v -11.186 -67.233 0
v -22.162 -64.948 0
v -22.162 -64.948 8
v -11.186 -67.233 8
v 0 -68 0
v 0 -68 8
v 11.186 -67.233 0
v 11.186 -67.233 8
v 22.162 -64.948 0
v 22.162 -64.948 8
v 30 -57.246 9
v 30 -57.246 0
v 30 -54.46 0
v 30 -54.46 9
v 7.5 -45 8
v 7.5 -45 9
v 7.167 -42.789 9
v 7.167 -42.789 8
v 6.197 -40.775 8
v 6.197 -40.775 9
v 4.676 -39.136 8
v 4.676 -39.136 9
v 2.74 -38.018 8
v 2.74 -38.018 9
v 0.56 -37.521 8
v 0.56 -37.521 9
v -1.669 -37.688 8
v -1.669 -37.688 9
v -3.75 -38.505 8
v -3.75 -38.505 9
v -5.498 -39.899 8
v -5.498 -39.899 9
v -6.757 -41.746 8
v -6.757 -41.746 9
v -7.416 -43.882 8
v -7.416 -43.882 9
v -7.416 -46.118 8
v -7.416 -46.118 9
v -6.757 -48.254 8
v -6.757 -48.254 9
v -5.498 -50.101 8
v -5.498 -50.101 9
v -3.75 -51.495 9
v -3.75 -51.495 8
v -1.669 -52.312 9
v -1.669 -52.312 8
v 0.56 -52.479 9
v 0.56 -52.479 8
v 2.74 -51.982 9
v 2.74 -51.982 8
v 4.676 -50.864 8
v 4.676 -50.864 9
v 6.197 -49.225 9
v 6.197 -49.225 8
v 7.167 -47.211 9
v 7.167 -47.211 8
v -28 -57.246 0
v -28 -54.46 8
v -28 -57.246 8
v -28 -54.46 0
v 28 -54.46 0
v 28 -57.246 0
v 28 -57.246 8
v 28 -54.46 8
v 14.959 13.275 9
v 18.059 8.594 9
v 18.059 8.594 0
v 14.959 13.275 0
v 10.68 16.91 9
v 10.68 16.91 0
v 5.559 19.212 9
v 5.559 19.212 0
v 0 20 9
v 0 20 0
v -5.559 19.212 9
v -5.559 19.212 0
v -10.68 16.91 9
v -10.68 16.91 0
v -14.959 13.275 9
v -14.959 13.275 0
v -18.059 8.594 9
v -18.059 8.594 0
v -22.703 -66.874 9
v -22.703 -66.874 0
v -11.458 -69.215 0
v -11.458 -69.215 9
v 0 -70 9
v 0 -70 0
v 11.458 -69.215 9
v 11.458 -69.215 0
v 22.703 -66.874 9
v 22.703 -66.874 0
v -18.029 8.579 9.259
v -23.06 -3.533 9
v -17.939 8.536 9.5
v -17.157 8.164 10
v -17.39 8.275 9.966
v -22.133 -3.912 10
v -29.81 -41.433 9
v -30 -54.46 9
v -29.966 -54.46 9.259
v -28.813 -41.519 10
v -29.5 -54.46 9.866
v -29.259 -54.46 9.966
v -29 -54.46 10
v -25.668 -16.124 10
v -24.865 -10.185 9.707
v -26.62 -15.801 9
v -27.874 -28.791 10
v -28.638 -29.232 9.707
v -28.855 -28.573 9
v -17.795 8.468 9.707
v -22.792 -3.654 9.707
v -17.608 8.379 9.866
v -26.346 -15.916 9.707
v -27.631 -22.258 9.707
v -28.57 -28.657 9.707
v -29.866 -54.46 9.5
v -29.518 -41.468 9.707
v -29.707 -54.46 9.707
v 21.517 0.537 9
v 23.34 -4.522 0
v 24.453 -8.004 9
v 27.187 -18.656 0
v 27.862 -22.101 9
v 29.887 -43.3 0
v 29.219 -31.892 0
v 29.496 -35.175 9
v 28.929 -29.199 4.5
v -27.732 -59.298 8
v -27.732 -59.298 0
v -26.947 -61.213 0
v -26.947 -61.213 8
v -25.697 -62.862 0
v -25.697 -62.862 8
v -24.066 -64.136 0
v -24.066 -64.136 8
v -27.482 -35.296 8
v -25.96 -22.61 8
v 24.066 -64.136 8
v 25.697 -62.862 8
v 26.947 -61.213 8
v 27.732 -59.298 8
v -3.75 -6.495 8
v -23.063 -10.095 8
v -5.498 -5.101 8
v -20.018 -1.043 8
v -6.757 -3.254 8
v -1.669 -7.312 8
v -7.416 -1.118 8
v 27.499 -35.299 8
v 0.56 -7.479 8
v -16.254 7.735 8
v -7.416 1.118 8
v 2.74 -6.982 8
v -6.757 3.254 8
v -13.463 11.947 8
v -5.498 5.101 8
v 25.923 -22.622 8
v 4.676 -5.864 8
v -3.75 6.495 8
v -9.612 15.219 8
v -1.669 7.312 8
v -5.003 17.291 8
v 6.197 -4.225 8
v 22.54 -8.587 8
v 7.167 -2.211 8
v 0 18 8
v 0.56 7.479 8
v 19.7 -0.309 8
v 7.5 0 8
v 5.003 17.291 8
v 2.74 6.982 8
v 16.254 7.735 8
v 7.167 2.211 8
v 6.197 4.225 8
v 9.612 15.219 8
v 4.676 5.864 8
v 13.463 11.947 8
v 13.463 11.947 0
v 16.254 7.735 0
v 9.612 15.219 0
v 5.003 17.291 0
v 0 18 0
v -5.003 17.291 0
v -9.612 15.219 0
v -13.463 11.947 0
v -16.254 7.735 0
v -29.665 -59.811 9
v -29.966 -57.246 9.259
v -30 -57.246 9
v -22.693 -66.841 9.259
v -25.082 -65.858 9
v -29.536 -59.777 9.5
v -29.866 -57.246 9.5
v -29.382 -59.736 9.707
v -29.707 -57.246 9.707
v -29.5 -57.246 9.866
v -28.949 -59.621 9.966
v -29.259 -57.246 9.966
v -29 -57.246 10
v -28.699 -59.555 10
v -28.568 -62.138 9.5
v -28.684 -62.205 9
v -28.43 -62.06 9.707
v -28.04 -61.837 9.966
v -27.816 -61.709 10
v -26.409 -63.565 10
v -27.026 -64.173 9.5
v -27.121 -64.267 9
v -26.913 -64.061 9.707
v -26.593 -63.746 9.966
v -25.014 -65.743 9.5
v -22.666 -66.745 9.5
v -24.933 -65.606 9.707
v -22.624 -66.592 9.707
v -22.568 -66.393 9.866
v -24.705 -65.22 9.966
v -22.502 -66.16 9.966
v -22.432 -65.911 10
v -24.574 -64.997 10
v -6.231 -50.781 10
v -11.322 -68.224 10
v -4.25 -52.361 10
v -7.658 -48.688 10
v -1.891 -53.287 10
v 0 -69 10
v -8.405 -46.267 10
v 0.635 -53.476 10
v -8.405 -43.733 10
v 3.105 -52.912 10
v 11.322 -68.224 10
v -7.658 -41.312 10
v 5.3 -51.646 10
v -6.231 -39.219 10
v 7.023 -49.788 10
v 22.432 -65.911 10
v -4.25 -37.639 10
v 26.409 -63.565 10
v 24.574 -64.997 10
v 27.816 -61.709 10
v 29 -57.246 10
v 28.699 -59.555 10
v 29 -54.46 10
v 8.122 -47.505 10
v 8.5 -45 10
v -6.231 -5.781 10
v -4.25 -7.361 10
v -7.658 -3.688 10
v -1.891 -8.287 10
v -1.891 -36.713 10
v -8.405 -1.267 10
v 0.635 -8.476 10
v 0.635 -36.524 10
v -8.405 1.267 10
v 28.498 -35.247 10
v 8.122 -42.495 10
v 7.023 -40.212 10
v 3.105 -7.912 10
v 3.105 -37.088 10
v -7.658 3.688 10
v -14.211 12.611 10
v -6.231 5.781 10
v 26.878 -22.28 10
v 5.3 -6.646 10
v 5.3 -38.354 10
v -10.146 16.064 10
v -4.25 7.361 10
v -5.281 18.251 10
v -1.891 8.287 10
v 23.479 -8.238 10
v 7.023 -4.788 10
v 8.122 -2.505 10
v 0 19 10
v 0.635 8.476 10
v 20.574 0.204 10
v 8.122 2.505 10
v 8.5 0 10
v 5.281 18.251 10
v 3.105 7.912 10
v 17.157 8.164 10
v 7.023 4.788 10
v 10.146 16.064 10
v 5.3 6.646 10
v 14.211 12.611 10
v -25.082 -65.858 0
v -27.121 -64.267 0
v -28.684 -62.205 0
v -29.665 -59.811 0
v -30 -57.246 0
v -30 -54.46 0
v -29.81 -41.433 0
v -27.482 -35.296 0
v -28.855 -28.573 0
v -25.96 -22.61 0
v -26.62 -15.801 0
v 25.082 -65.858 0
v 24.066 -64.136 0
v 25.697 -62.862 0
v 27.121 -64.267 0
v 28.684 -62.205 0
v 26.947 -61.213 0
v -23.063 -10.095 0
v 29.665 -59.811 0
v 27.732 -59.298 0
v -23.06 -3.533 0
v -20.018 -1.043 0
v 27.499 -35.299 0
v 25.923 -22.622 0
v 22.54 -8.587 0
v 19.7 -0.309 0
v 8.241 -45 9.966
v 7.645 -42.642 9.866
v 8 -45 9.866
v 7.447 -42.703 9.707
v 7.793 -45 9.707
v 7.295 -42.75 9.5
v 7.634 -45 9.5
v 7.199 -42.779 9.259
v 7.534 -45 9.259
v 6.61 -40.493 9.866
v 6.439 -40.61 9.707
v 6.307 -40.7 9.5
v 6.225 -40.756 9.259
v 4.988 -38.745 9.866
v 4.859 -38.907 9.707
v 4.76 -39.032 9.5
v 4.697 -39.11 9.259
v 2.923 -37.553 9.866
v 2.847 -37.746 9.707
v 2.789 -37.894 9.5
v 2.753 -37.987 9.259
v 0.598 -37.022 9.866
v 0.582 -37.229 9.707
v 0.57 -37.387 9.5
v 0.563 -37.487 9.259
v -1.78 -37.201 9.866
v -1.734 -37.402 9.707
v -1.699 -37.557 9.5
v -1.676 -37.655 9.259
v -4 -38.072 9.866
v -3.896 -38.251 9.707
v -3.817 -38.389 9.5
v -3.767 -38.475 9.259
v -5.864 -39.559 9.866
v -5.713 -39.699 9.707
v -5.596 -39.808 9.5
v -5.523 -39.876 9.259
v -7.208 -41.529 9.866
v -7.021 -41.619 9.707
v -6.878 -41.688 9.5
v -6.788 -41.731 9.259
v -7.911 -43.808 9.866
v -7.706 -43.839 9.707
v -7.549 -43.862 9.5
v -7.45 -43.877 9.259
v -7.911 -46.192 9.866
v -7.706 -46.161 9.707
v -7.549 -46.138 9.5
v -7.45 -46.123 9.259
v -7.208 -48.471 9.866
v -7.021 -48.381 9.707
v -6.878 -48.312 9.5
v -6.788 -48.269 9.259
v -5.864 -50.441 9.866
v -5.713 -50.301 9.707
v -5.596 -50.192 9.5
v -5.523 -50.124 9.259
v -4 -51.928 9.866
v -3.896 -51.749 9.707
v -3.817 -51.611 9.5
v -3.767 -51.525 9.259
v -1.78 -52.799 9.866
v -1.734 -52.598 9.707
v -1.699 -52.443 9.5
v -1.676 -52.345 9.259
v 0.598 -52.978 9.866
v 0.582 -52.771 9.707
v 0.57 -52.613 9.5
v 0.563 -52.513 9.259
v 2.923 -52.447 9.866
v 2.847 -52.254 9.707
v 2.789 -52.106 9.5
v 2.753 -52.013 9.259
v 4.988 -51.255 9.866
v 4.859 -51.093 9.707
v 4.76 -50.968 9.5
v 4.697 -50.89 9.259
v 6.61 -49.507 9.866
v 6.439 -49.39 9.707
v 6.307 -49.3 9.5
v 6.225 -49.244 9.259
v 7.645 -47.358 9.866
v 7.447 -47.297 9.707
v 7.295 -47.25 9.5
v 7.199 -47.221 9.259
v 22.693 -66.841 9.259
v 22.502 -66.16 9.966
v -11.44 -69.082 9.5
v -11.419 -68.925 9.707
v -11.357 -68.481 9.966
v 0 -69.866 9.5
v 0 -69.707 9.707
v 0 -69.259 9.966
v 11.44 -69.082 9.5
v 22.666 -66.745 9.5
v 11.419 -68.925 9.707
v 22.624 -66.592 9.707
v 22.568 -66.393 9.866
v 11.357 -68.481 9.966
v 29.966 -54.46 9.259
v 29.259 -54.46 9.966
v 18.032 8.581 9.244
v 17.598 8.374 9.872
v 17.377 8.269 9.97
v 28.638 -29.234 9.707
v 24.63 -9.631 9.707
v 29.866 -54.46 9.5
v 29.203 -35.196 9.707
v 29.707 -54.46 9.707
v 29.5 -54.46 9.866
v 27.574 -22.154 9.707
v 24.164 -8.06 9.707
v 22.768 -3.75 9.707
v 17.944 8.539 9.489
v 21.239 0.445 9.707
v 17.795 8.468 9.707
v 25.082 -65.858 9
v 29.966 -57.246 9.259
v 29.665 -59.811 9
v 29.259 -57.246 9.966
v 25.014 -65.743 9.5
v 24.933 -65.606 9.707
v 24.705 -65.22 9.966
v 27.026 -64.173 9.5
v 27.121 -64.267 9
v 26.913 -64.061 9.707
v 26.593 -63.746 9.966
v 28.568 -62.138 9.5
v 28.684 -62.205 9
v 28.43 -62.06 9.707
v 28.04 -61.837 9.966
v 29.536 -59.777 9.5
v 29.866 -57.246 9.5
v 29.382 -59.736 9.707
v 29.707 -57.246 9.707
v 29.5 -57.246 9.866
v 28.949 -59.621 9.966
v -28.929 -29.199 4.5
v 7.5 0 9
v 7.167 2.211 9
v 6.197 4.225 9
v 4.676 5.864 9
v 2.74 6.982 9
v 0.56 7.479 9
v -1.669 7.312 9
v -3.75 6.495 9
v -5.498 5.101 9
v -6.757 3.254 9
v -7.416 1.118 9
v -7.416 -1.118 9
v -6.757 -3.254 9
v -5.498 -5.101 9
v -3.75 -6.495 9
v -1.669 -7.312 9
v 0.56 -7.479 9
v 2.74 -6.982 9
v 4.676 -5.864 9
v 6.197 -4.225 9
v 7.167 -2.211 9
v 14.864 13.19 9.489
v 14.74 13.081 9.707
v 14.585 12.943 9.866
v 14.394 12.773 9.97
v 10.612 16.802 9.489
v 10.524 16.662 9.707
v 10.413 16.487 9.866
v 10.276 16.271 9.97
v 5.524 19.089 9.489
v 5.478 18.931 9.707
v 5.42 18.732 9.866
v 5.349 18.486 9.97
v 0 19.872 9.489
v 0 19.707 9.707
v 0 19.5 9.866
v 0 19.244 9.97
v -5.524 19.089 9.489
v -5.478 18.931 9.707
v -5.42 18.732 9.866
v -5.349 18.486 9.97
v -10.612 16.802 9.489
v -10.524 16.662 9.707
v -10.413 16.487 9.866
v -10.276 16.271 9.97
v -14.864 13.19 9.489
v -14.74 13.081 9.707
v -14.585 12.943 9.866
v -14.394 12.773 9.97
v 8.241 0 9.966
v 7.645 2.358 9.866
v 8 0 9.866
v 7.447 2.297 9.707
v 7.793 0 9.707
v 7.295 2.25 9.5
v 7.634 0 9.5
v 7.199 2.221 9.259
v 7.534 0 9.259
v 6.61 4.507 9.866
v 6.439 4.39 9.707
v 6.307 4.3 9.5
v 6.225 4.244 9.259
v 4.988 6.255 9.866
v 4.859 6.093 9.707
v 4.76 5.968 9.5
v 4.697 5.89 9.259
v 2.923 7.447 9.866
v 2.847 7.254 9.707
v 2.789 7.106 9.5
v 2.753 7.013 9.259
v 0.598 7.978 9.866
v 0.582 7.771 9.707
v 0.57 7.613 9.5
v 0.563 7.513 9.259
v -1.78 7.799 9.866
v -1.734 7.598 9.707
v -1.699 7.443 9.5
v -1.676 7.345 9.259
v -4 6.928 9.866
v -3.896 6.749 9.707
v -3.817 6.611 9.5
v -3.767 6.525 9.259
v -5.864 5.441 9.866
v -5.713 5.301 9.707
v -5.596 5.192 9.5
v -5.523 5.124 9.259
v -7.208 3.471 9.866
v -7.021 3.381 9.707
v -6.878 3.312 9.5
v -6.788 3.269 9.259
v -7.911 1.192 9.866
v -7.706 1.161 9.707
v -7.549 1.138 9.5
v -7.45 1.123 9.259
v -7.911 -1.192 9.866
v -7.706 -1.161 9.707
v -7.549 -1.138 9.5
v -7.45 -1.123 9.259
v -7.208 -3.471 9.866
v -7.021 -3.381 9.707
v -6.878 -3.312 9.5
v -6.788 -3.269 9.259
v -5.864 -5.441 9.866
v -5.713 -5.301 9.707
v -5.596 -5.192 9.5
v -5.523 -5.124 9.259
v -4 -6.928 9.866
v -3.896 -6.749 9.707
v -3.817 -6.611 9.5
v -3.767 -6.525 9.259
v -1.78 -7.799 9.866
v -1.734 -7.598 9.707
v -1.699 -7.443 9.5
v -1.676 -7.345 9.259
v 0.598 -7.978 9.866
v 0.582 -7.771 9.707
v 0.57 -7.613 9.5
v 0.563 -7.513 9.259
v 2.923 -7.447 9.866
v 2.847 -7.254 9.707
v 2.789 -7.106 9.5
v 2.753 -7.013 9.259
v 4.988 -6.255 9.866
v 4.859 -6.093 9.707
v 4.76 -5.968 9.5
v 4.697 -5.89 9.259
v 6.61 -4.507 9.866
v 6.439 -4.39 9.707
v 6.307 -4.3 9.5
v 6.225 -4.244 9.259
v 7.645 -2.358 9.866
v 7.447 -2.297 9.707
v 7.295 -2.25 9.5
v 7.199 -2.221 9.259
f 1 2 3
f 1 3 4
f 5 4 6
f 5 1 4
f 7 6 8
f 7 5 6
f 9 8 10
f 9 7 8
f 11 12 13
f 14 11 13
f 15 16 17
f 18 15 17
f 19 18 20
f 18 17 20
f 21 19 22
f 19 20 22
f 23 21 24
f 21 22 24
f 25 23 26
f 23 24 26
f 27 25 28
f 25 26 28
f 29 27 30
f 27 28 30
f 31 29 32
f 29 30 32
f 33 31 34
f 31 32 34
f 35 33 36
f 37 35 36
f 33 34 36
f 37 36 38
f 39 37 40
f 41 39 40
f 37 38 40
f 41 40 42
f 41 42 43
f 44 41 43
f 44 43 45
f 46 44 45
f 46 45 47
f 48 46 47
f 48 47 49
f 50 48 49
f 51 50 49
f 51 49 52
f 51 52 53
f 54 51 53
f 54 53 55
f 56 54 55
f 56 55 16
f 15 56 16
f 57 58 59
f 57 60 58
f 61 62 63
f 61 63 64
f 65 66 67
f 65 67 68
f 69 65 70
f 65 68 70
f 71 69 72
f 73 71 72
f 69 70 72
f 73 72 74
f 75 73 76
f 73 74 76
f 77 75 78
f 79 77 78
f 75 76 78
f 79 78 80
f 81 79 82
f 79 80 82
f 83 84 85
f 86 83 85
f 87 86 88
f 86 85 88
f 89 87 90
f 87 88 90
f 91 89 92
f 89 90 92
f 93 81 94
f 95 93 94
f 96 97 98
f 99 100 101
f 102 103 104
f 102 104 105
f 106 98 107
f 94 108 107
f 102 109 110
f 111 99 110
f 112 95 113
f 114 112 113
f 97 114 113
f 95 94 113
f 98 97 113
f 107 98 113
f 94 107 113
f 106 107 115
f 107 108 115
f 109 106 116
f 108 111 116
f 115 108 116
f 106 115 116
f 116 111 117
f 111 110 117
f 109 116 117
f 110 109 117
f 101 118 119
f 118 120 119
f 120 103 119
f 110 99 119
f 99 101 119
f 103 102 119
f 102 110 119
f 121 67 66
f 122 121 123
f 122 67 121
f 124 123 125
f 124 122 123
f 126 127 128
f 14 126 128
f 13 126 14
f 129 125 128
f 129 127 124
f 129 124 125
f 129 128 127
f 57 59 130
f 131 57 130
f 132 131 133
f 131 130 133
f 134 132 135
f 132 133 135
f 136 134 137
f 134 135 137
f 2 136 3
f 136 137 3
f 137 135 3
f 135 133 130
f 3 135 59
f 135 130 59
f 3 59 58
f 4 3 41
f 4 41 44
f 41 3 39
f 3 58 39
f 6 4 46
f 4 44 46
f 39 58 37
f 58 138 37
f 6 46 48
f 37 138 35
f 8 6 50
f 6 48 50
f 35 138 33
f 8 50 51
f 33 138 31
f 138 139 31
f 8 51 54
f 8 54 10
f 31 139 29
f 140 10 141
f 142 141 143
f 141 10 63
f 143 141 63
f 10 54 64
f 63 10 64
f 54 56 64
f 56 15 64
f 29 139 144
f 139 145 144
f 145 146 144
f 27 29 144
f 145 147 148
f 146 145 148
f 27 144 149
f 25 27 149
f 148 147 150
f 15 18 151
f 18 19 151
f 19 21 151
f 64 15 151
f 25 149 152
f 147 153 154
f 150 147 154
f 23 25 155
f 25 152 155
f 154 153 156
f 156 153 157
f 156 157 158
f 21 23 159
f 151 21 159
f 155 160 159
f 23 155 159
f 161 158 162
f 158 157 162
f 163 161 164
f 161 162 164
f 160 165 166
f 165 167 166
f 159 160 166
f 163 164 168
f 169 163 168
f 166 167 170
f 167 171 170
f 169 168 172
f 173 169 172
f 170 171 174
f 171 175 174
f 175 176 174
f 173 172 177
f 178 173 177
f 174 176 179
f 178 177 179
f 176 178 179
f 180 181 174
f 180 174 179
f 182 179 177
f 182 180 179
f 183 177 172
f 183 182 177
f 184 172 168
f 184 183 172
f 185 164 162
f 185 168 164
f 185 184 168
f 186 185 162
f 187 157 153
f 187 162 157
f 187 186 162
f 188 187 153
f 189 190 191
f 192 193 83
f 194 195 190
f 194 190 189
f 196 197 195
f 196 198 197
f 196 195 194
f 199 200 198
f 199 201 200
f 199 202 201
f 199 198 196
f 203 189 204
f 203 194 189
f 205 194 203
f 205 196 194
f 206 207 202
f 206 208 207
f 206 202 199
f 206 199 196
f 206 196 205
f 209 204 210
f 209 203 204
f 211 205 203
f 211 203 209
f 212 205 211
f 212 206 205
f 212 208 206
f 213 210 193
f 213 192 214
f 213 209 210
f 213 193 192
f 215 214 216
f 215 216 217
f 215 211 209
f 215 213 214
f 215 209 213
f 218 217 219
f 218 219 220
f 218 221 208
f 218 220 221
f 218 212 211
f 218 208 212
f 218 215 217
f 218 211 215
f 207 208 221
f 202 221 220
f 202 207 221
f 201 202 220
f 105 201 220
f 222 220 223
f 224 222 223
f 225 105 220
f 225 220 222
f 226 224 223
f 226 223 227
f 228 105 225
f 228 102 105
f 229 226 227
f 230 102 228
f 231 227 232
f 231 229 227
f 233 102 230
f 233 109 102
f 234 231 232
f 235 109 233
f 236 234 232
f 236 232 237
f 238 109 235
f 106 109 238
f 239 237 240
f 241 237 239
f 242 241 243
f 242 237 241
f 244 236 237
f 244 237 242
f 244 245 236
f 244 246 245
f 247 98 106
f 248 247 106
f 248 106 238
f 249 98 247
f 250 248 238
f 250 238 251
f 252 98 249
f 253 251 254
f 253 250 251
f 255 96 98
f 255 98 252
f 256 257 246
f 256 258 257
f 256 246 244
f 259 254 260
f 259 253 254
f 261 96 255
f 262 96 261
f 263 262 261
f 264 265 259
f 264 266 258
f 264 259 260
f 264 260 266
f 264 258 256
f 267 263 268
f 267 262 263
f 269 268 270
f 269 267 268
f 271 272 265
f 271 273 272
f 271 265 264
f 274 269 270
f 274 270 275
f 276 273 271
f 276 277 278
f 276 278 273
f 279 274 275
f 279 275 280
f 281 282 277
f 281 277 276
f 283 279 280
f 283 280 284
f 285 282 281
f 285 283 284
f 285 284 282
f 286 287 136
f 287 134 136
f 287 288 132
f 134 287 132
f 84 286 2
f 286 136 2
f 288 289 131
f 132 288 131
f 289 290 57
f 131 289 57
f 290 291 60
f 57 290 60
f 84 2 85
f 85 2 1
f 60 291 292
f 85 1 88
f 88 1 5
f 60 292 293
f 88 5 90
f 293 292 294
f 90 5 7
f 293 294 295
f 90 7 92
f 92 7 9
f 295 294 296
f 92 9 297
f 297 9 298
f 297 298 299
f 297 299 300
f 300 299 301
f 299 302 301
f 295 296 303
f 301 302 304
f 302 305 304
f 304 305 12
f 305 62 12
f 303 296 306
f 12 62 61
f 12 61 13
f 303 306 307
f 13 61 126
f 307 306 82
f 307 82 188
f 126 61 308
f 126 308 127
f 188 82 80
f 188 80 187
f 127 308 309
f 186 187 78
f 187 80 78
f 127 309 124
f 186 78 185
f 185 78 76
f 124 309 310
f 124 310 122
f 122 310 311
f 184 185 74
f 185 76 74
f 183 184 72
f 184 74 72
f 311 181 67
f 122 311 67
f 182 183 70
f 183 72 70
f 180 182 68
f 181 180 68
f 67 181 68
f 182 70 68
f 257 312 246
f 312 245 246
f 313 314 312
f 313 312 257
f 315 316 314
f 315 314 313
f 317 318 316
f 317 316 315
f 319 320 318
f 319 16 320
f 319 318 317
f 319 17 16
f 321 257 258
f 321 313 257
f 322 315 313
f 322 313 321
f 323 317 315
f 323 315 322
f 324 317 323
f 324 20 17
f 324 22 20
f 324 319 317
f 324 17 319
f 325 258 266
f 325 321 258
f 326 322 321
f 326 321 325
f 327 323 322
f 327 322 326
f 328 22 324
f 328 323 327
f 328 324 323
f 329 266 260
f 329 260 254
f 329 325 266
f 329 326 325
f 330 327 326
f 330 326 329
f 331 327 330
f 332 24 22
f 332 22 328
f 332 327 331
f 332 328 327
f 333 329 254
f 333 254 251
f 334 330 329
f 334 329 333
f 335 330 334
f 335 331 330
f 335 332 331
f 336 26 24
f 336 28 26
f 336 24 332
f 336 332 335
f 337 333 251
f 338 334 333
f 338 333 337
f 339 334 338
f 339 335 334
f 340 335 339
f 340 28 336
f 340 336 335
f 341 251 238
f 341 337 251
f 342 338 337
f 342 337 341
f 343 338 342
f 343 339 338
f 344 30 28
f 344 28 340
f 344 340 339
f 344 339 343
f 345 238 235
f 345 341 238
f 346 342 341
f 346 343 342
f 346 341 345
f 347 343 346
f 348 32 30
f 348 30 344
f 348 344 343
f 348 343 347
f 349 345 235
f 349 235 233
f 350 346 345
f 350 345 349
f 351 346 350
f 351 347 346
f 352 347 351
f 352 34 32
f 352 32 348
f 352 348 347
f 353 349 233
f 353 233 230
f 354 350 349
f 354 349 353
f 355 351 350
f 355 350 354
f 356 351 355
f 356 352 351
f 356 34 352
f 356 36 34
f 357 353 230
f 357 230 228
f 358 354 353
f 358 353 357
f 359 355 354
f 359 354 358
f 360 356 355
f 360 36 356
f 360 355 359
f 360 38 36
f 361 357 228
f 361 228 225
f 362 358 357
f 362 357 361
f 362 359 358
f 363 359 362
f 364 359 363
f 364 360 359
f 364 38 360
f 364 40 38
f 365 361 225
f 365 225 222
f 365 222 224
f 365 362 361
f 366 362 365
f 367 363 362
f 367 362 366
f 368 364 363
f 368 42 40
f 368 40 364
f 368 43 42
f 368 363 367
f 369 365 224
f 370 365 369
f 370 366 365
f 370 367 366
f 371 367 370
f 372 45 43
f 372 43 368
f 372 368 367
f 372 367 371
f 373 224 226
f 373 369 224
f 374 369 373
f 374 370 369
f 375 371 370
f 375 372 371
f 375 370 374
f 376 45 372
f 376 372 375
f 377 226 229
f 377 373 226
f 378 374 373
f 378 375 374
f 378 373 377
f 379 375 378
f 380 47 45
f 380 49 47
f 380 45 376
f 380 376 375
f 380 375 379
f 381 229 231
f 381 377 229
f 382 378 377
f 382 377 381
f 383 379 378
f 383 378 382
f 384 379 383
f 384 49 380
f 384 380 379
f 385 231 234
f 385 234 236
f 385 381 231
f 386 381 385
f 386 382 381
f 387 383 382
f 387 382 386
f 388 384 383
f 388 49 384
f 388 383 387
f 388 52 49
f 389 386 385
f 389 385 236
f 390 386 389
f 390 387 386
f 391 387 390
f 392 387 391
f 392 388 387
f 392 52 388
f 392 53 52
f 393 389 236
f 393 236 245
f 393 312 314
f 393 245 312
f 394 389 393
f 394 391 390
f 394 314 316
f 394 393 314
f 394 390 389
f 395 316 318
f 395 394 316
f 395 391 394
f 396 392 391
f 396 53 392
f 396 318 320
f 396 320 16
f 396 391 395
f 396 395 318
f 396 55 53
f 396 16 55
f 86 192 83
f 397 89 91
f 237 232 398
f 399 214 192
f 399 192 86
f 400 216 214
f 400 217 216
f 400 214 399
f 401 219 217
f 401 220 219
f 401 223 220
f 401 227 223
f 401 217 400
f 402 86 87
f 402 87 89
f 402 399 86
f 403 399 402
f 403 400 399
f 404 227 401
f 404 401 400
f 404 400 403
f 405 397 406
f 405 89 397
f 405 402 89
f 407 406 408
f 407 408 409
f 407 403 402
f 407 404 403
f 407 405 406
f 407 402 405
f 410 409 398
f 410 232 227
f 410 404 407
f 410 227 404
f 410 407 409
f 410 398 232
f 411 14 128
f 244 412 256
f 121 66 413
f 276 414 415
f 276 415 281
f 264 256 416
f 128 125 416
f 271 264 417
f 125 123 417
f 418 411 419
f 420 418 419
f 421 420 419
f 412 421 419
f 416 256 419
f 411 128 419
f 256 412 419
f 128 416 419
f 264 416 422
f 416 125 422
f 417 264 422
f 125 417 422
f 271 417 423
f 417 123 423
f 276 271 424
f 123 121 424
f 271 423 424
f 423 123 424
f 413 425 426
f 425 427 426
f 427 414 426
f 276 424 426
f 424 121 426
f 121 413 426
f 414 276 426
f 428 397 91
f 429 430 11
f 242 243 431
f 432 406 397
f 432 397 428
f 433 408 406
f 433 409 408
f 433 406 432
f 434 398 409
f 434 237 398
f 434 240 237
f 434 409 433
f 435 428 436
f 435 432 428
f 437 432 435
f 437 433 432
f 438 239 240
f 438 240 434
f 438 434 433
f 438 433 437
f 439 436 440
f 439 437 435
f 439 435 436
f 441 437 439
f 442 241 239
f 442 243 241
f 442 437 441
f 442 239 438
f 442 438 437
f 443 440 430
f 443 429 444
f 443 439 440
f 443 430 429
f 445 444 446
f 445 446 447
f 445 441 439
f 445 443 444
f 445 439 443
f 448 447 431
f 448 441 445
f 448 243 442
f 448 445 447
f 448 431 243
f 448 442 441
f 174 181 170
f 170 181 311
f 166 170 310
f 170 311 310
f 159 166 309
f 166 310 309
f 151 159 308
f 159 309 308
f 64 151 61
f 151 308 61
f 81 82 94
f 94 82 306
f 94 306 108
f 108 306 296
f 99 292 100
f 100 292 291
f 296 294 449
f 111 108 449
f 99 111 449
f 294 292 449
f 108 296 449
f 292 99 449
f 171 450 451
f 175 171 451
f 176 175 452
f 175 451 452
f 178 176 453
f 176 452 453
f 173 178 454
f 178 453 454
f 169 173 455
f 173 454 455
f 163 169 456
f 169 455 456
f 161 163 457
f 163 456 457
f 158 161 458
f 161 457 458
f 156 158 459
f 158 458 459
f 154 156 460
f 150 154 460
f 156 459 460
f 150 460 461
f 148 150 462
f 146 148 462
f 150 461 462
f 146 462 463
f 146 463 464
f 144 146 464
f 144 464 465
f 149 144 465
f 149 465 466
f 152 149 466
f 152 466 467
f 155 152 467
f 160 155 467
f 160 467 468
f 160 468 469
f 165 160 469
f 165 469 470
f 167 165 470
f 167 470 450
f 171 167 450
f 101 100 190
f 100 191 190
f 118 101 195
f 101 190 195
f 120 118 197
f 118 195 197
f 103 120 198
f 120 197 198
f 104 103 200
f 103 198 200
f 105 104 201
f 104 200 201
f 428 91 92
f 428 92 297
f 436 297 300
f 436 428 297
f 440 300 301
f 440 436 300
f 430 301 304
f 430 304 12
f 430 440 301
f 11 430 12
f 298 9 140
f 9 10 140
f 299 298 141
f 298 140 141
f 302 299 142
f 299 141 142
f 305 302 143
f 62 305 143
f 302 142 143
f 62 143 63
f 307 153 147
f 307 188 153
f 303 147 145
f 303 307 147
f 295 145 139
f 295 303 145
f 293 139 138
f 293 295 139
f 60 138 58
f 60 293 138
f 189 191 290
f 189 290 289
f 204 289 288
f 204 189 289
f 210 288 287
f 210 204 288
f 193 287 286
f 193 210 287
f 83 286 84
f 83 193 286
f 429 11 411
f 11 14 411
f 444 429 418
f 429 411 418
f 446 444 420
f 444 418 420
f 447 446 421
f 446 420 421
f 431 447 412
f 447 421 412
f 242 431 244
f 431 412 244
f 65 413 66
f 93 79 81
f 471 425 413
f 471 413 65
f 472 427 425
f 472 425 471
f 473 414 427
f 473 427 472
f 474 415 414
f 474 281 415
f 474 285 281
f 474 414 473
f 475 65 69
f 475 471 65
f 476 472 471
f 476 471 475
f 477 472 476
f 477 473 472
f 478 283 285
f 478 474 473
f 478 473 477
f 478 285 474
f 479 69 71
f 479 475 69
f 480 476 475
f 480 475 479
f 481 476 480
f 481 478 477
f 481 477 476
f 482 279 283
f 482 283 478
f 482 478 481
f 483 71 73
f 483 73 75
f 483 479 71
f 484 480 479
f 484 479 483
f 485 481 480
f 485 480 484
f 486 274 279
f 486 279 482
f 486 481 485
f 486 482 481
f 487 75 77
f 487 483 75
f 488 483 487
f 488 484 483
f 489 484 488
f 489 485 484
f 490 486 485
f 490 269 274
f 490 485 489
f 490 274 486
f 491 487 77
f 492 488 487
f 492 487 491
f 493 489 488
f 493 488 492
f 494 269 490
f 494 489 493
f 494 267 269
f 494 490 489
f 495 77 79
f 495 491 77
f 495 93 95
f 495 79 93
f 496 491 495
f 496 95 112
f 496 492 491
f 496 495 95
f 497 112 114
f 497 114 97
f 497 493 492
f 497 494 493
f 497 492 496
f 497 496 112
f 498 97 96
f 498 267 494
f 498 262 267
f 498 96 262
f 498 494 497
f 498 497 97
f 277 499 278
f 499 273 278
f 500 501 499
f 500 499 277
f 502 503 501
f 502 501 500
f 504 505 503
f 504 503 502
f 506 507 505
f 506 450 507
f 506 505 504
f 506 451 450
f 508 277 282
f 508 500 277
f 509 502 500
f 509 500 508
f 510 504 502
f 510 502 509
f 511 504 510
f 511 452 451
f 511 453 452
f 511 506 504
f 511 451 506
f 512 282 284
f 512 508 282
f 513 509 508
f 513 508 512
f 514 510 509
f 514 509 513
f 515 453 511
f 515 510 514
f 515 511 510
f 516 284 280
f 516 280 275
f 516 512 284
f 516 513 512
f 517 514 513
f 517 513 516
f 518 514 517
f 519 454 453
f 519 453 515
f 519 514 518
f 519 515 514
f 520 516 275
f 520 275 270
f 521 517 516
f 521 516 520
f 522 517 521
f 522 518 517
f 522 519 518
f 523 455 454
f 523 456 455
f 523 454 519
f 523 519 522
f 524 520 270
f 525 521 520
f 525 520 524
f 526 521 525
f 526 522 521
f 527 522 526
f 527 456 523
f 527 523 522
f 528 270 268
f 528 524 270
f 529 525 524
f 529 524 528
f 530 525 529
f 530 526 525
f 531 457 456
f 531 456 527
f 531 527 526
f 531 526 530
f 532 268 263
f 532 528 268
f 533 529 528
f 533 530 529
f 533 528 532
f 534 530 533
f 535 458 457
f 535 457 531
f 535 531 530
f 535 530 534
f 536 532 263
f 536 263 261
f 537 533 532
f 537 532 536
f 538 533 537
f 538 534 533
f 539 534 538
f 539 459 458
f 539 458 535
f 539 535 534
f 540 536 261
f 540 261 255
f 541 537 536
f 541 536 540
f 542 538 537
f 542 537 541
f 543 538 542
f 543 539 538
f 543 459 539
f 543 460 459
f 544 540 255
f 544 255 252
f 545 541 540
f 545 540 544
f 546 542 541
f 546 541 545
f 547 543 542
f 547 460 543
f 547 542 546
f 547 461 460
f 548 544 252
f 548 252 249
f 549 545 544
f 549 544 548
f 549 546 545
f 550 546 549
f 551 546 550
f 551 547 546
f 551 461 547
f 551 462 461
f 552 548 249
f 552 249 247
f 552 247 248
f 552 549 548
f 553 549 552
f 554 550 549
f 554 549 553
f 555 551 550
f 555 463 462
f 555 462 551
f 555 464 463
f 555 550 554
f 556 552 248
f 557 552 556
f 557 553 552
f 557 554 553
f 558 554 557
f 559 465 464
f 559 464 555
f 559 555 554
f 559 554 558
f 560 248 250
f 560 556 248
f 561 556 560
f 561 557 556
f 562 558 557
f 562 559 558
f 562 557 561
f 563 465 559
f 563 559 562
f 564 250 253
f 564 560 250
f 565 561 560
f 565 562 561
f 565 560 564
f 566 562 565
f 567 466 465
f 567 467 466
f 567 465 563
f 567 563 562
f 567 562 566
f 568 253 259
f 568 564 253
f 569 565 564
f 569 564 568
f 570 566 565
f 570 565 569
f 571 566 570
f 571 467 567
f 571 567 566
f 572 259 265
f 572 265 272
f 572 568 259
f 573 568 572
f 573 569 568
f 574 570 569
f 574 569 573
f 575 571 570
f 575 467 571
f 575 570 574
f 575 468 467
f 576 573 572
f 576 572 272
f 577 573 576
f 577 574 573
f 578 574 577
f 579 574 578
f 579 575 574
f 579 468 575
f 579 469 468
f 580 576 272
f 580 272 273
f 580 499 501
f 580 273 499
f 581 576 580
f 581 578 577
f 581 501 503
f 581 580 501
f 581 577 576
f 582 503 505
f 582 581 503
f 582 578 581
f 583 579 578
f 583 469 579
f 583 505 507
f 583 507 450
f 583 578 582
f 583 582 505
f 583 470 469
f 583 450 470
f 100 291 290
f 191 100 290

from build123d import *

# Parameters (mm, degrees)
EXTRUDE_1_DEPTH     = 10
FILLET_1_R          = 10
SHELL_1_T           = -2
SKETCH_2_R          = 7.5
CUT_EXTRUDE_1_DEPTH = 10
FILLET_2_R          = 1


with BuildPart() as part:
    # 草图1 → 凸台-拉伸1 (new body)
    with BuildSketch(Plane.XY):
        with BuildLine():
            add(Edge.make_bspline(
                [(-18.059479814, 8.593904168), (-23.948193256, -3.780809287), (-29.696472288, -24.34126392), (-30, -45.953108691), (-30, -54.460180984)],
                knots=[0, 0, 0, 0, 0.608662134, 1, 1, 1, 1], degree=3))
            Line((-30, -54.460180984), (-30, -64.460180984))
            ThreePointArc((-30, -64.460180984), (0, -70), (30, -64.460180984))
            Line((30, -64.460180984), (30, -54.460180984))
            add(Edge.make_bspline(
                [(18.059479814, 8.593904168), (23.423782854, -2.678798038), (29.865056496, -24.432184966), (30, -46.291744963), (30, -54.460180984)],
                knots=[0, 0, 0, 0, 0.608662134, 1, 1, 1, 1], degree=3))
            ThreePointArc((18.059479814, 8.593904168), (0, 20), (-18.059479814, 8.593904168))
        make_face()
    extrude(amount=EXTRUDE_1_DEPTH)

    # 圆角1
    fillet_1_edges = [part.edges().sort_by_distance(p)[0] for p in [
        (30, -64.460180984, 5),
        (-30, -64.460180984, 5),
    ]]
    fillet(fillet_1_edges, radius=FILLET_1_R)

    # 抽壳1
    shell_1_openings = [part.faces().sort_by_distance(p)[0] for p in [
        (0, -33.886417401, 0),
    ]]
    offset(amount=SHELL_1_T, openings=shell_1_openings, kind=Kind.INTERSECTION)

    # 草图2 → 切除-拉伸1 (cut)
    with BuildSketch(Plane.XY.offset(10)):
        Circle(SKETCH_2_R)
        with Locations((0, -45)):
            Circle(SKETCH_2_R)
    extrude(amount=-CUT_EXTRUDE_1_DEPTH, mode=Mode.SUBTRACT)

    # 圆角2
    fillet_2_edges = [part.edges().sort_by_distance(p)[0] for p in [
        (-30, -55.853116753, 10),
        (0, -70, 10),
        (30, -55.853116753, 10),
        (27.969536593, -63.286457019, 10),
        (-27.969536593, -63.286457019, 10),
        (-7.5, 0, 10),
        (-7.5, -45, 10),
        (0, 20, 10),
    ]]
    fillet(fillet_2_edges, radius=FILLET_2_R)


solid = part.part
